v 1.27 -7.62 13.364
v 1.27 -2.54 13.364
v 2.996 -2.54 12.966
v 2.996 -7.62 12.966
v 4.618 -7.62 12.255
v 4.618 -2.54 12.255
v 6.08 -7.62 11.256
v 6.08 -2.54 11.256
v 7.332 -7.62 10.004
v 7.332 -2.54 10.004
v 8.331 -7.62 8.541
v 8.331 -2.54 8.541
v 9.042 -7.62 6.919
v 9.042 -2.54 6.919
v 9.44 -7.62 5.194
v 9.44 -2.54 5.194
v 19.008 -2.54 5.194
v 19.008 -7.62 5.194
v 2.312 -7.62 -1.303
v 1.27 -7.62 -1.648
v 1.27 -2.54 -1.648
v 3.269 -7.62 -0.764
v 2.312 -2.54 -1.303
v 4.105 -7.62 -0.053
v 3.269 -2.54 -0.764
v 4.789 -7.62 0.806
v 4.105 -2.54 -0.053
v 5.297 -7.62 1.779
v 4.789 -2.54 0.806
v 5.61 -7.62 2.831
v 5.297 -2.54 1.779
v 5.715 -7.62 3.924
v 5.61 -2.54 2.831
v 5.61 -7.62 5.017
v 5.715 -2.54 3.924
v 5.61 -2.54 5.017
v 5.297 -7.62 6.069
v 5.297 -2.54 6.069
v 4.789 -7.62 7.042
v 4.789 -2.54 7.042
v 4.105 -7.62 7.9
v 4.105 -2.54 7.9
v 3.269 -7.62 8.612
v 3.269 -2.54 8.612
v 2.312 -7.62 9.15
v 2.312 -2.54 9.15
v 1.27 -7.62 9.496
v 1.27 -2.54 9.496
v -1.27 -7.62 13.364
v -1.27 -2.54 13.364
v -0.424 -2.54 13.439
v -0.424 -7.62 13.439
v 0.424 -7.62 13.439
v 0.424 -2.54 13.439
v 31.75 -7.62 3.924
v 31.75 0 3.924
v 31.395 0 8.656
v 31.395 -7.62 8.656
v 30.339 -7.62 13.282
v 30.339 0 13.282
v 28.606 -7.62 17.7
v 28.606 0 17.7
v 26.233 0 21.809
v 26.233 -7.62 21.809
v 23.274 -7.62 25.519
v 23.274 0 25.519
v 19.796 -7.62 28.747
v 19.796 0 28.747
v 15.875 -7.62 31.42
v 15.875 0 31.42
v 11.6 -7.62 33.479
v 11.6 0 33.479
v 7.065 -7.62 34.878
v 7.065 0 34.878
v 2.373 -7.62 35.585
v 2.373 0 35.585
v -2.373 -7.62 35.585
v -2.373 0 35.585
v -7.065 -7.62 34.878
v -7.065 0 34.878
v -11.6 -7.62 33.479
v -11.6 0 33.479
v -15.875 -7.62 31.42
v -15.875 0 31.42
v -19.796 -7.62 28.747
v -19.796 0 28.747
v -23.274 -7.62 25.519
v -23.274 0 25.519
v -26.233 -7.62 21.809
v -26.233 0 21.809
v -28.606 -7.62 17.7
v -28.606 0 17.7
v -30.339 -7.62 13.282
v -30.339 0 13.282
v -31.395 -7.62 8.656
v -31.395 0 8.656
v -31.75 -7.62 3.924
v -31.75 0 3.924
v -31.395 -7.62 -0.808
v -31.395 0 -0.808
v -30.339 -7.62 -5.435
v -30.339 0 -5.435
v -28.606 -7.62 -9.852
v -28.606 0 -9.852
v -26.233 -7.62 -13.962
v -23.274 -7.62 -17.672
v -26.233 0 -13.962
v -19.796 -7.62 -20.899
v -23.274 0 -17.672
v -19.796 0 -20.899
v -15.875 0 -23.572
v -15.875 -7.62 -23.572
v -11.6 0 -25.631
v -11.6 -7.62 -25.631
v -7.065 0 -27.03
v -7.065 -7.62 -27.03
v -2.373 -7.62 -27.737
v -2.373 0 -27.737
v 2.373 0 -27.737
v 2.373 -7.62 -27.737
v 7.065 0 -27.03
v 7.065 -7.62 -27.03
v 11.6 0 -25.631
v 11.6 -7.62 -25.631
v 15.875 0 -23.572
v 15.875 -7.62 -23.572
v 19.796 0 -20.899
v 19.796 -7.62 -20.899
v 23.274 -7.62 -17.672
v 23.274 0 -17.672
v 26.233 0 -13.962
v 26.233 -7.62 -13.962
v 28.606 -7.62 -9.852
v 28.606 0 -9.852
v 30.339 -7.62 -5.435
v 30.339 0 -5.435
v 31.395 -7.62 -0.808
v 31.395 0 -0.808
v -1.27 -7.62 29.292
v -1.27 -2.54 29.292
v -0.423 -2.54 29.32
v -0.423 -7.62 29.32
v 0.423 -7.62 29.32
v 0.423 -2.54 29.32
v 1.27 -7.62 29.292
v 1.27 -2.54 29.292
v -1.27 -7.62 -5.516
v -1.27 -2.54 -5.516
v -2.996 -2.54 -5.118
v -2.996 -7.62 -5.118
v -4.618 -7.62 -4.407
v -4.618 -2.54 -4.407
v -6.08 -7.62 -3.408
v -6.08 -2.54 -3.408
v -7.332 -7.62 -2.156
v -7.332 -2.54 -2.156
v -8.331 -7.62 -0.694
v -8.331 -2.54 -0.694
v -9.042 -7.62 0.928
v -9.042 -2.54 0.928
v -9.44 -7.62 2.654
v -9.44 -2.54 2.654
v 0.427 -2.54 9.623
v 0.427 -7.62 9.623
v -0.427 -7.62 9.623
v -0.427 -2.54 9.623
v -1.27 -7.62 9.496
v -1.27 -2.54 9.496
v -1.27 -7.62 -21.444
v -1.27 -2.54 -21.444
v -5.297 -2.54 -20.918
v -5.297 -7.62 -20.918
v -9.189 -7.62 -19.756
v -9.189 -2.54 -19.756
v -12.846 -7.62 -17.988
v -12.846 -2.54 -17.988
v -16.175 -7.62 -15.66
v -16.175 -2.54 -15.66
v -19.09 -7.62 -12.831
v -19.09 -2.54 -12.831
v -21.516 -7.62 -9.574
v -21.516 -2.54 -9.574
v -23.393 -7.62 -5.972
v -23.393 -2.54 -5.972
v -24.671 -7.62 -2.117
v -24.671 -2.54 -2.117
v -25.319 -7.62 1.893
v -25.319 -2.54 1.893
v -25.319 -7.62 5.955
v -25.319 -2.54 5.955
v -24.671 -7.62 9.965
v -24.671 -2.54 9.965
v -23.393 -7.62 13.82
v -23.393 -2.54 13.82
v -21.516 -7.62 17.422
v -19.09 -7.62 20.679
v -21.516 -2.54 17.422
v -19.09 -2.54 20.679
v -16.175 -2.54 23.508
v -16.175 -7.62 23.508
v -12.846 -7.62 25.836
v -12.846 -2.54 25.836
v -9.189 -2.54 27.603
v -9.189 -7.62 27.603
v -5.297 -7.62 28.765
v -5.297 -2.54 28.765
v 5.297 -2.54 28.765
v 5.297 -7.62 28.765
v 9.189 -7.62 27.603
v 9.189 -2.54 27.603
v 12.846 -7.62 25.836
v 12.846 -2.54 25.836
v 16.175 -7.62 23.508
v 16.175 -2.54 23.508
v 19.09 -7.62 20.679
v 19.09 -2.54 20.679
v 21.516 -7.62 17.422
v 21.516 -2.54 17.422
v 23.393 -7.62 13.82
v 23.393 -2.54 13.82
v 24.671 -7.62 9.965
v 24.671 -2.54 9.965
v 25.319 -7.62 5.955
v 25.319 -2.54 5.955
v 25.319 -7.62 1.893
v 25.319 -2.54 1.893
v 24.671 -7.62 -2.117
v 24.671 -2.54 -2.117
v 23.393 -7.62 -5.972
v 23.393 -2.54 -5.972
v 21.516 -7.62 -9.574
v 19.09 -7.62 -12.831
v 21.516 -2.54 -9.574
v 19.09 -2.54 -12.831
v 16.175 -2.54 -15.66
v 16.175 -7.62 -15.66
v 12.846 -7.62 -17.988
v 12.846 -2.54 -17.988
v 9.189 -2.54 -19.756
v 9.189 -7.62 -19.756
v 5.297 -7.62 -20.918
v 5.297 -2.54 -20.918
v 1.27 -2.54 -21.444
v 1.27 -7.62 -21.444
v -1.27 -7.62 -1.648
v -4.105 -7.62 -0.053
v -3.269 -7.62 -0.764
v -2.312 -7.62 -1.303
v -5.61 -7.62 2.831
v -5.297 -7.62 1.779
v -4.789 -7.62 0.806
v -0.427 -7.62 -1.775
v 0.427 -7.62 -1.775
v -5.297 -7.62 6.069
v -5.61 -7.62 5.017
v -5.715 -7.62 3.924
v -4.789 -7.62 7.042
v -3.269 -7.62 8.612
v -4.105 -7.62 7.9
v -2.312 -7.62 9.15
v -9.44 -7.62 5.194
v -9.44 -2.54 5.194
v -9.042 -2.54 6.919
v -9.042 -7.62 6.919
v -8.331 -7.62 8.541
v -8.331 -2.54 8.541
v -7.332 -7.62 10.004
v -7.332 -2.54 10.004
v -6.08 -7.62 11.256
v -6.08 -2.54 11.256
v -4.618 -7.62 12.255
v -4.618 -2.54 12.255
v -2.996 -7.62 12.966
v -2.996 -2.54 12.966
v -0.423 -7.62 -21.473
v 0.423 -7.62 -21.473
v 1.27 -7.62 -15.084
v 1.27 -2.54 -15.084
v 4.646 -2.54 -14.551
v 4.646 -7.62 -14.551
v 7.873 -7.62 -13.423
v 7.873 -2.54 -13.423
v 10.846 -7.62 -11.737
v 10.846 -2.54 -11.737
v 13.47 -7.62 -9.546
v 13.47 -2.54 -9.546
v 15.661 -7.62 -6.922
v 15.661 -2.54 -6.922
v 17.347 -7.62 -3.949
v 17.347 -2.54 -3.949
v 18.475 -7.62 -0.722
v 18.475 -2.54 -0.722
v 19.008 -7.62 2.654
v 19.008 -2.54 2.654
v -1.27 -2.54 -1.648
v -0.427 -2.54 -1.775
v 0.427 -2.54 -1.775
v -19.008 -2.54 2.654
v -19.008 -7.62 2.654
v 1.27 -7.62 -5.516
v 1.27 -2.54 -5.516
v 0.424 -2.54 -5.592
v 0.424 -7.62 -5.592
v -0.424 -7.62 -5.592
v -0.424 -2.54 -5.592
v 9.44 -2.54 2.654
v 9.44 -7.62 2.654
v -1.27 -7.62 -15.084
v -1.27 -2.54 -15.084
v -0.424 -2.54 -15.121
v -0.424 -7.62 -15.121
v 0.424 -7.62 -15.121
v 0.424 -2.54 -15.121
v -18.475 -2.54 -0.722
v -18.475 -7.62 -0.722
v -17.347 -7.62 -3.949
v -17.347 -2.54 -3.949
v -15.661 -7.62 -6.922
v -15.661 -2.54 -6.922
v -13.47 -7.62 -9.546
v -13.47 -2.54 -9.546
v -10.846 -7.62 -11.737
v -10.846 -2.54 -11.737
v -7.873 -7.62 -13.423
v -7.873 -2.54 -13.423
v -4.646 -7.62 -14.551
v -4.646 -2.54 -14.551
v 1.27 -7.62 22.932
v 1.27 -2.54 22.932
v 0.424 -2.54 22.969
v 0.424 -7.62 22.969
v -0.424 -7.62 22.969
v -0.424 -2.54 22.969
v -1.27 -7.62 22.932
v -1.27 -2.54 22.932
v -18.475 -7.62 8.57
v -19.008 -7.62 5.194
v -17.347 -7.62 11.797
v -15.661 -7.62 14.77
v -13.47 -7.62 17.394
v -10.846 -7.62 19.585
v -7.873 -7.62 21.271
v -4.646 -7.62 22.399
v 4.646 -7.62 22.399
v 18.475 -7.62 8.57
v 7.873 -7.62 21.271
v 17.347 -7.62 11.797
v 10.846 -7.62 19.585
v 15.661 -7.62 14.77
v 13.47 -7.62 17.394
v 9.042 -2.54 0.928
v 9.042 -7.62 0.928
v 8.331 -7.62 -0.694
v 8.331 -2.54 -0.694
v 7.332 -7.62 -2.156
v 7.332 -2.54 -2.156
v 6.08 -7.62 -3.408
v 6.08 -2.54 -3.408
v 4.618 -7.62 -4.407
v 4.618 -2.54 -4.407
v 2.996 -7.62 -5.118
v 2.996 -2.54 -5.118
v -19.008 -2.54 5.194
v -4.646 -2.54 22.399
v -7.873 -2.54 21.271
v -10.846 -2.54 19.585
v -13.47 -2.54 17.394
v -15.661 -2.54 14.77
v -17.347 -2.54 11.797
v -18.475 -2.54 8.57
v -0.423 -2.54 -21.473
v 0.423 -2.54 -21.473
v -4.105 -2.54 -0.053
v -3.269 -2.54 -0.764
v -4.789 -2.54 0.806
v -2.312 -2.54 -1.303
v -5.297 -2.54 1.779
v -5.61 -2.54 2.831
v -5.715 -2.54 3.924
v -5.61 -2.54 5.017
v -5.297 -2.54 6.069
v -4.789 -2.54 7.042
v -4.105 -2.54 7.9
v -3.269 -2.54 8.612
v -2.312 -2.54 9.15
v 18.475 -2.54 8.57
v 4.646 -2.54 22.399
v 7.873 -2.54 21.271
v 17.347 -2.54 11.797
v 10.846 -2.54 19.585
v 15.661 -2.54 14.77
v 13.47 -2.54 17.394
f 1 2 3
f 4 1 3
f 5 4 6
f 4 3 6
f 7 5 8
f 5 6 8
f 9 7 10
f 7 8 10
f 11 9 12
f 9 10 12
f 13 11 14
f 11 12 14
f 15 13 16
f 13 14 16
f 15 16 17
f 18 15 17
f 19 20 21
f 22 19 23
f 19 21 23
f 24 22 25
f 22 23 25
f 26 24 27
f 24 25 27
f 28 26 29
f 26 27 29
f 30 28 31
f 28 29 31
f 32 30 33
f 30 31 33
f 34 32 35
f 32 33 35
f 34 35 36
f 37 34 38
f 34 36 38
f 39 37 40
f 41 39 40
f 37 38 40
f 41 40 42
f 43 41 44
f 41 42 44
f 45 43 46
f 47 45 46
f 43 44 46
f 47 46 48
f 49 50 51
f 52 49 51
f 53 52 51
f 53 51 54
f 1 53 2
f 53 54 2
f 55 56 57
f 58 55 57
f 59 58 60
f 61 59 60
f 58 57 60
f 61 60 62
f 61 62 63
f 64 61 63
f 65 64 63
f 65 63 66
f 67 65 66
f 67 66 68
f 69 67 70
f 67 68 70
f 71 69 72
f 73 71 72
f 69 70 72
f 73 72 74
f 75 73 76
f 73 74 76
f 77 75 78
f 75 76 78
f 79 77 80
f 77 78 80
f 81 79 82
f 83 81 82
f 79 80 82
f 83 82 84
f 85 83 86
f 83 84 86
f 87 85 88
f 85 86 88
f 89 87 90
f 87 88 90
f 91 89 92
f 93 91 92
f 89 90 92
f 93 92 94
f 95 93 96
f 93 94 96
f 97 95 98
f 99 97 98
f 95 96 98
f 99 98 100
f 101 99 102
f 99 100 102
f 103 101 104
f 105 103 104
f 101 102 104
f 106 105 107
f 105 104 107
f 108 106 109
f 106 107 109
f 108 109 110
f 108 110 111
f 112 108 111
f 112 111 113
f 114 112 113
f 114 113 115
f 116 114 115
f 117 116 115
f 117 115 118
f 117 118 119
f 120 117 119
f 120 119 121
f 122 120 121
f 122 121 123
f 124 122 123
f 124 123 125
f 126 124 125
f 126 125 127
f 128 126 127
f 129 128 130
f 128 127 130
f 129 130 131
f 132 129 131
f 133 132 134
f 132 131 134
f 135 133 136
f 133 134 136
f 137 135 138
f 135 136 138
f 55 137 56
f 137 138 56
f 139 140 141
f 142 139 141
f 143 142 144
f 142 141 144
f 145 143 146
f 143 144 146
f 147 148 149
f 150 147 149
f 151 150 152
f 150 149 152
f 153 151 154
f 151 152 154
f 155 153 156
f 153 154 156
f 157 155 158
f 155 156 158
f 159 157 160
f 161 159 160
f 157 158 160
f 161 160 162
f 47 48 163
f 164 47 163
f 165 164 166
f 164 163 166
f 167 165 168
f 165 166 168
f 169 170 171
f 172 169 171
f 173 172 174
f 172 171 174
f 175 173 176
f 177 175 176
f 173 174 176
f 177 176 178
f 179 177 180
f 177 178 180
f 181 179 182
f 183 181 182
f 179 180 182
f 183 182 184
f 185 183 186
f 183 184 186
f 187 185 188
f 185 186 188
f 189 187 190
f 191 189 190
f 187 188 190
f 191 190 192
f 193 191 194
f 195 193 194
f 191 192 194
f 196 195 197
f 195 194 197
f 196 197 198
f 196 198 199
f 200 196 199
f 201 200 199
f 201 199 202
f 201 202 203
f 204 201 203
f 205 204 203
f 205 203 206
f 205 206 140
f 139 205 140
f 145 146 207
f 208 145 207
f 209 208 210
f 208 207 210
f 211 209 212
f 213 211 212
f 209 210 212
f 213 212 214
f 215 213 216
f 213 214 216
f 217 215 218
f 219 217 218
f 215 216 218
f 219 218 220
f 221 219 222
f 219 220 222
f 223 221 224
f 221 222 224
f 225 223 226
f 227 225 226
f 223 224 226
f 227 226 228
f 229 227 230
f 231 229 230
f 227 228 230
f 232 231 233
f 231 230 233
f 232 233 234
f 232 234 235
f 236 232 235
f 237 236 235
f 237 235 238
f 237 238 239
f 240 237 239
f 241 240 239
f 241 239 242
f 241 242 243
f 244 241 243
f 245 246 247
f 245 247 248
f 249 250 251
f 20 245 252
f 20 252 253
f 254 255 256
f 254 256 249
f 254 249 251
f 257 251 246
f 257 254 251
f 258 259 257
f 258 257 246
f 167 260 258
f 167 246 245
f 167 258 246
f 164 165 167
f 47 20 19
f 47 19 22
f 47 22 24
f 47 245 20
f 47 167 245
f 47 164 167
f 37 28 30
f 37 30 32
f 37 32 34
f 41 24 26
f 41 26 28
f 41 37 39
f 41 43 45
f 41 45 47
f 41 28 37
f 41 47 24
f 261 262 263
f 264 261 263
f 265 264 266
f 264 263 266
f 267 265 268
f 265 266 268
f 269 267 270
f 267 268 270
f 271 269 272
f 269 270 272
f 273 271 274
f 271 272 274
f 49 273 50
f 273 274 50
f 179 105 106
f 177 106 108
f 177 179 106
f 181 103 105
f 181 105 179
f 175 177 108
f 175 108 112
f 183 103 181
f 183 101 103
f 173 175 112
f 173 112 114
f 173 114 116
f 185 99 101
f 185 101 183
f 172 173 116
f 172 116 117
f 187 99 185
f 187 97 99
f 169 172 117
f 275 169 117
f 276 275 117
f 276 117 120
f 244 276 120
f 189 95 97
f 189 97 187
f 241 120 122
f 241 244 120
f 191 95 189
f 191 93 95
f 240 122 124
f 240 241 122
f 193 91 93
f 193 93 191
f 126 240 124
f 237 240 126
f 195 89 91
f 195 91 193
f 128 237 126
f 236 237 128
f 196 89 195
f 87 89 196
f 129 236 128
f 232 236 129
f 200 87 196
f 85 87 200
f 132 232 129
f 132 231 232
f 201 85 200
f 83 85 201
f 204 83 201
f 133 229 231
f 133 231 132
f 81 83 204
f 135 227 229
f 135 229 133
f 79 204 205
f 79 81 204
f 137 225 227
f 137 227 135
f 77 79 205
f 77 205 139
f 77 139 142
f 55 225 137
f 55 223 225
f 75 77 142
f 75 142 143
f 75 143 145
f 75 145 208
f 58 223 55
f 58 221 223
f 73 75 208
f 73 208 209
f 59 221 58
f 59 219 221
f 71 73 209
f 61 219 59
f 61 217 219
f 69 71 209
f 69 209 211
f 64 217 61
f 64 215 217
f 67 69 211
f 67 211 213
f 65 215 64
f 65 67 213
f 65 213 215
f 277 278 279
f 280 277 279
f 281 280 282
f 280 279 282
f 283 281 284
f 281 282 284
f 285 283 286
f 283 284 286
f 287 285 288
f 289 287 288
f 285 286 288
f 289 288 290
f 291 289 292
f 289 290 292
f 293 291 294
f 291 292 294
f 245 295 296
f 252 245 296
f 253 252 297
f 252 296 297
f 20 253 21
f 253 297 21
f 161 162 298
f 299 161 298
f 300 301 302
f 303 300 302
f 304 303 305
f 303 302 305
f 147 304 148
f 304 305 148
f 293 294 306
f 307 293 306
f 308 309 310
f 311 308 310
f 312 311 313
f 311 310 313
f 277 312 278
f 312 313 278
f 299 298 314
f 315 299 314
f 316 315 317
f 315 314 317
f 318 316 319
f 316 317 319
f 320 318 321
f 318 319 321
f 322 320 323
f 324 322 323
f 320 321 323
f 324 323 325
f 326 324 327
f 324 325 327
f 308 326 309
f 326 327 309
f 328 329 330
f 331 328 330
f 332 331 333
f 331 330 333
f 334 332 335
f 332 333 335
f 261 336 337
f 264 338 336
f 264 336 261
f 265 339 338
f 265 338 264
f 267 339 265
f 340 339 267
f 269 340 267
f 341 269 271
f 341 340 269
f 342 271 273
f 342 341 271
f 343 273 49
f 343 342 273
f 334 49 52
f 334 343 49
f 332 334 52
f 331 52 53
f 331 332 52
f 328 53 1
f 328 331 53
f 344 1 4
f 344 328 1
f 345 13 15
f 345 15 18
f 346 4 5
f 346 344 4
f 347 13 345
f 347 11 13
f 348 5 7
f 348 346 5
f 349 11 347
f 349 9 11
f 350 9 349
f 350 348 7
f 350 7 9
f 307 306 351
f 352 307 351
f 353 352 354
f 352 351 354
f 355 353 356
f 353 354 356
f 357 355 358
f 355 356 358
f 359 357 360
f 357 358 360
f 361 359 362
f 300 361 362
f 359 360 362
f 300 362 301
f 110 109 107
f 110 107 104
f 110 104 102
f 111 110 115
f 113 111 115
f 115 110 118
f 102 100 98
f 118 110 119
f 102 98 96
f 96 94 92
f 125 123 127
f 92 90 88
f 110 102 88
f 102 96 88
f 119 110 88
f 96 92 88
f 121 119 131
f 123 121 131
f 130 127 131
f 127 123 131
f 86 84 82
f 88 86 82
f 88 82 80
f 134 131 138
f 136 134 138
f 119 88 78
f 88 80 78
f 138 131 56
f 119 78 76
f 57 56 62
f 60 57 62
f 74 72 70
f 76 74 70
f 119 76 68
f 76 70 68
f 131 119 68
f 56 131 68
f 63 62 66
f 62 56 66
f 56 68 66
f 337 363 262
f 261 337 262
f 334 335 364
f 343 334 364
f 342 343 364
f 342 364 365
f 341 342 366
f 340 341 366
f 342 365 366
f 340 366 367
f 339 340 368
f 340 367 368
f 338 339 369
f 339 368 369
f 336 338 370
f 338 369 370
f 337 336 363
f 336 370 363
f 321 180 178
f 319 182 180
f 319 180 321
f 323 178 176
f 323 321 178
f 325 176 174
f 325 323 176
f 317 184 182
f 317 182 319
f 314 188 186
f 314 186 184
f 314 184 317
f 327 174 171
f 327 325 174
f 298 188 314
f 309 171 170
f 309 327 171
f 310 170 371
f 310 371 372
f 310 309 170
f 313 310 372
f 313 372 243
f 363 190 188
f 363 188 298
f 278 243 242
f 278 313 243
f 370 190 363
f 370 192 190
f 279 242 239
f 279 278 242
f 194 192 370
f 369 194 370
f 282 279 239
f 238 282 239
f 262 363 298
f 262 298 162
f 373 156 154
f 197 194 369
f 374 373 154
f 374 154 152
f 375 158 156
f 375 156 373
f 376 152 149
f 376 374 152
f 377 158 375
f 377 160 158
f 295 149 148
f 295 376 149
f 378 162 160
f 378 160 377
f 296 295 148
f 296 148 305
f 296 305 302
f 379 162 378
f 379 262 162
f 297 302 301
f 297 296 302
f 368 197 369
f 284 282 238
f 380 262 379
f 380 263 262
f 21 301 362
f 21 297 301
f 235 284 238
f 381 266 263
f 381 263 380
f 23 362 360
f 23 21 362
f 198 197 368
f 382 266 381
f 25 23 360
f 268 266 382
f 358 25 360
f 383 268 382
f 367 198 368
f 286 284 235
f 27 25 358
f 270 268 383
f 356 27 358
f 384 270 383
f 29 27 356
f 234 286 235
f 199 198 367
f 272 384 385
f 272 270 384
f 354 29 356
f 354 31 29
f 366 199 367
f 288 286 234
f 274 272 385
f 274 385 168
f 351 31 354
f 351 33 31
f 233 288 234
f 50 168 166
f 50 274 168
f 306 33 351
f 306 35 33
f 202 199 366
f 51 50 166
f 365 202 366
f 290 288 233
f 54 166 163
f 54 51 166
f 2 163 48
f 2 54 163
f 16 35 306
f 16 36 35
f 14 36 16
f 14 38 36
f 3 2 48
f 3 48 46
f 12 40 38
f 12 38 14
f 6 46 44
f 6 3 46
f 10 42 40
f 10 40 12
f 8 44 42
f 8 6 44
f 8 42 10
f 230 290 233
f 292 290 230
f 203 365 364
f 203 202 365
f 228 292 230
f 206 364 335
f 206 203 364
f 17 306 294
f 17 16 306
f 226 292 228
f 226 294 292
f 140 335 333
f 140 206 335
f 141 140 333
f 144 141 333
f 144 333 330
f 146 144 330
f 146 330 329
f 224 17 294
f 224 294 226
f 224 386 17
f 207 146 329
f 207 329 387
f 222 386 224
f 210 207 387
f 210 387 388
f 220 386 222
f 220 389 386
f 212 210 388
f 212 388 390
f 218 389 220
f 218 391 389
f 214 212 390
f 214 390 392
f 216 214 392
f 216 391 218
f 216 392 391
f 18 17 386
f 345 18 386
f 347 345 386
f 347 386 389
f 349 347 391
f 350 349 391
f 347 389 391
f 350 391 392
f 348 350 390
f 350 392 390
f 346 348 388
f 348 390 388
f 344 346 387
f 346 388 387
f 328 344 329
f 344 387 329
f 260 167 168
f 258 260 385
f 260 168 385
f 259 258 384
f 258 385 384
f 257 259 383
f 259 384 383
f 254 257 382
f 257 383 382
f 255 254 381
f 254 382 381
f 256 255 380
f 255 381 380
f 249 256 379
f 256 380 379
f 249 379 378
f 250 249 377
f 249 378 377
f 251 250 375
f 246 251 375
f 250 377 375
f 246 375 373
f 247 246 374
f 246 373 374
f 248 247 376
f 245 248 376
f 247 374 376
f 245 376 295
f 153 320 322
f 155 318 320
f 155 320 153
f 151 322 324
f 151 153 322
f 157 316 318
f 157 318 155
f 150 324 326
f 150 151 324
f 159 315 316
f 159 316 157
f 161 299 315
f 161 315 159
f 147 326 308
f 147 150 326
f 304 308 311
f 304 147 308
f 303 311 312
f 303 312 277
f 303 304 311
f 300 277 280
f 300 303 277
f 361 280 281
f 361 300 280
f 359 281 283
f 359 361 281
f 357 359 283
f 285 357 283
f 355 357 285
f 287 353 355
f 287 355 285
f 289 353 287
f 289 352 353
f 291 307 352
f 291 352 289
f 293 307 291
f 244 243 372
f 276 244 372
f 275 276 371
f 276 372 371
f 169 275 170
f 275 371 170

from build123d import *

# Parameters (mm, degrees)
F0_R     = 31.75
F1_DEPTH = 7.62
F2_DEPTH = 2.54


with BuildPart() as f1:
    # F0 (on Front) → F1 (new body)
    with BuildSketch(Plane.XZ):
        with Locations((0, 3.923906)):
            Circle(F0_R)
        with BuildLine():
            ThreePointArc((-1.27, 29.292136), (0, 29.323906), (1.27, 29.292136))
            ThreePointArc((1.27, 29.292136), (25.4, 3.923906), (1.27, -21.444324))
            ThreePointArc((1.27, -21.444324), (0, -21.476094), (-1.27, -21.444324))
            ThreePointArc((-1.27, -21.444324), (-25.4, 3.923906), (-1.27, 29.292136))
        make_face(mode=Mode.SUBTRACT)
        with BuildLine():
            ThreePointArc((1.27, -1.648196), (5.715, 3.923906), (1.27, 9.496008))
            ThreePointArc((1.27, 9.496008), (0, 9.638906), (-1.27, 9.496008))
            ThreePointArc((-1.27, 9.496008), (-5.715, 3.923906), (-1.27, -1.648196))
            ThreePointArc((-1.27, -1.648196), (0, -1.791094), (1.27, -1.648196))
        make_face()
        with BuildLine():
            ThreePointArc((19.00762, 5.193906), (13.470384, 17.39429), (1.27, 22.931525))
            ThreePointArc((1.27, 22.931525), (0, 22.973906), (-1.27, 22.931525))
            ThreePointArc((-1.27, 22.931525), (-13.470384, 17.39429), (-19.00762, 5.193906))
            Line((-19.00762, 5.193906), (-9.439954, 5.193906))
            ThreePointArc((-9.439954, 5.193906), (-6.735192, 10.659098), (-1.27, 13.36386))
            ThreePointArc((-1.27, 13.36386), (0, 13.448906), (1.27, 13.36386))
            ThreePointArc((1.27, 13.36386), (6.735192, 10.659098), (9.439954, 5.193906))
            Line((9.439954, 5.193906), (19.00762, 5.193906))
        make_face()
        with BuildLine():
            ThreePointArc((1.27, -15.083714), (13.470384, -9.546478), (19.00762, 2.653906))
            Line((19.00762, 2.653906), (9.439954, 2.653906))
            ThreePointArc((9.439954, 2.653906), (6.735192, -2.811286), (1.27, -5.516048))
            ThreePointArc((1.27, -5.516048), (0, -5.601094), (-1.27, -5.516048))
            ThreePointArc((-1.27, -5.516048), (-6.735192, -2.811286), (-9.439954, 2.653906))
            Line((-9.439954, 2.653906), (-19.00762, 2.653906))
            ThreePointArc((-19.00762, 2.653906), (-13.470384, -9.546478), (-1.27, -15.083714))
            ThreePointArc((-1.27, -15.083714), (0, -15.126094), (1.27, -15.083714))
        make_face()
    extrude(amount=F1_DEPTH)

    # F0 (on Front) → F2 (join)
    with BuildSketch(Plane.XZ):
        with BuildLine():
            ThreePointArc((-19.00762, 5.193906), (-13.470384, 17.39429), (-1.27, 22.931525))
            Line((-1.27, 22.931525), (-1.27, 29.292136))
            ThreePointArc((-1.27, 29.292136), (-25.4, 3.923906), (-1.27, -21.444324))
            Line((-1.27, -21.444324), (-1.27, -15.083714))
            ThreePointArc((-1.27, -15.083714), (-13.470384, -9.546478), (-19.00762, 2.653906))
            ThreePointArc((-19.00762, 2.653906), (-19.05, 3.923906), (-19.00762, 5.193906))
        make_face()
        with BuildLine():
            Line((1.27, 29.292136), (1.27, 22.931525))
            ThreePointArc((1.27, 22.931525), (13.470384, 17.39429), (19.00762, 5.193906))
            ThreePointArc((19.00762, 5.193906), (19.05, 3.923906), (19.00762, 2.653906))
            ThreePointArc((19.00762, 2.653906), (13.470384, -9.546478), (1.27, -15.083714))
            Line((1.27, -15.083714), (1.27, -21.444324))
            ThreePointArc((1.27, -21.444324), (25.4, 3.923906), (1.27, 29.292136))
        make_face()
        with BuildLine():
            ThreePointArc((19.00762, 2.653906), (19.05, 3.923906), (19.00762, 5.193906))
            Line((19.00762, 5.193906), (9.439954, 5.193906))
            ThreePointArc((9.439954, 5.193906), (6.735192, 10.659098), (1.27, 13.36386))
            Line((1.27, 13.36386), (1.27, 9.496008))
            ThreePointArc((1.27, 9.496008), (5.715, 3.923906), (1.27, -1.648196))
            Line((1.27, -1.648196), (1.27, -5.516048))
            ThreePointArc((1.27, -5.516048), (6.735192, -2.811286), (9.439954, 2.653906))
            Line((9.439954, 2.653906), (19.00762, 2.653906))
        make_face()
        with BuildLine():
            Line((-9.439954, 5.193906), (-19.00762, 5.193906))
            ThreePointArc((-19.00762, 5.193906), (-19.05, 3.923906), (-19.00762, 2.653906))
            Line((-19.00762, 2.653906), (-9.439954, 2.653906))
            ThreePointArc((-9.439954, 2.653906), (-6.735192, -2.811286), (-1.27, -5.516048))
            Line((-1.27, -5.516048), (-1.27, -1.648196))
            ThreePointArc((-1.27, -1.648196), (-5.715, 3.923906), (-1.27, 9.496008))
            Line((-1.27, 9.496008), (-1.27, 13.36386))
            ThreePointArc((-1.27, 13.36386), (-6.735192, 10.659098), (-9.439954, 5.193906))
        make_face()
        with BuildLine():
            ThreePointArc((-1.27, 22.931525), (0, 22.973906), (1.27, 22.931525))
            Line((1.27, 22.931525), (1.27, 29.292136))
            ThreePointArc((1.27, 29.292136), (0, 29.323906), (-1.27, 29.292136))
            Line((-1.27, 29.292136), (-1.27, 22.931525))
        make_face()
        with BuildLine():
            Line((1.27, 9.496008), (1.27, 13.36386))
            ThreePointArc((1.27, 13.36386), (0, 13.448906), (-1.27, 13.36386))
            Line((-1.27, 13.36386), (-1.27, 9.496008))
            ThreePointArc((-1.27, 9.496008), (0, 9.638906), (1.27, 9.496008))
        make_face()
        with BuildLine():
            ThreePointArc((-1.27, -5.516048), (0, -5.601094), (1.27, -5.516048))
            Line((1.27, -5.516048), (1.27, -1.648196))
            ThreePointArc((1.27, -1.648196), (0, -1.791094), (-1.27, -1.648196))
            Line((-1.27, -1.648196), (-1.27, -5.516048))
        make_face()
        with BuildLine():
            ThreePointArc((-1.27, -21.444324), (0, -21.476094), (1.27, -21.444324))
            Line((1.27, -21.444324), (1.27, -15.083714))
            ThreePointArc((1.27, -15.083714), (0, -15.126094), (-1.27, -15.083714))
            Line((-1.27, -15.083714), (-1.27, -21.444324))
        make_face()
    extrude(amount=F2_DEPTH)


solid = f1.part
